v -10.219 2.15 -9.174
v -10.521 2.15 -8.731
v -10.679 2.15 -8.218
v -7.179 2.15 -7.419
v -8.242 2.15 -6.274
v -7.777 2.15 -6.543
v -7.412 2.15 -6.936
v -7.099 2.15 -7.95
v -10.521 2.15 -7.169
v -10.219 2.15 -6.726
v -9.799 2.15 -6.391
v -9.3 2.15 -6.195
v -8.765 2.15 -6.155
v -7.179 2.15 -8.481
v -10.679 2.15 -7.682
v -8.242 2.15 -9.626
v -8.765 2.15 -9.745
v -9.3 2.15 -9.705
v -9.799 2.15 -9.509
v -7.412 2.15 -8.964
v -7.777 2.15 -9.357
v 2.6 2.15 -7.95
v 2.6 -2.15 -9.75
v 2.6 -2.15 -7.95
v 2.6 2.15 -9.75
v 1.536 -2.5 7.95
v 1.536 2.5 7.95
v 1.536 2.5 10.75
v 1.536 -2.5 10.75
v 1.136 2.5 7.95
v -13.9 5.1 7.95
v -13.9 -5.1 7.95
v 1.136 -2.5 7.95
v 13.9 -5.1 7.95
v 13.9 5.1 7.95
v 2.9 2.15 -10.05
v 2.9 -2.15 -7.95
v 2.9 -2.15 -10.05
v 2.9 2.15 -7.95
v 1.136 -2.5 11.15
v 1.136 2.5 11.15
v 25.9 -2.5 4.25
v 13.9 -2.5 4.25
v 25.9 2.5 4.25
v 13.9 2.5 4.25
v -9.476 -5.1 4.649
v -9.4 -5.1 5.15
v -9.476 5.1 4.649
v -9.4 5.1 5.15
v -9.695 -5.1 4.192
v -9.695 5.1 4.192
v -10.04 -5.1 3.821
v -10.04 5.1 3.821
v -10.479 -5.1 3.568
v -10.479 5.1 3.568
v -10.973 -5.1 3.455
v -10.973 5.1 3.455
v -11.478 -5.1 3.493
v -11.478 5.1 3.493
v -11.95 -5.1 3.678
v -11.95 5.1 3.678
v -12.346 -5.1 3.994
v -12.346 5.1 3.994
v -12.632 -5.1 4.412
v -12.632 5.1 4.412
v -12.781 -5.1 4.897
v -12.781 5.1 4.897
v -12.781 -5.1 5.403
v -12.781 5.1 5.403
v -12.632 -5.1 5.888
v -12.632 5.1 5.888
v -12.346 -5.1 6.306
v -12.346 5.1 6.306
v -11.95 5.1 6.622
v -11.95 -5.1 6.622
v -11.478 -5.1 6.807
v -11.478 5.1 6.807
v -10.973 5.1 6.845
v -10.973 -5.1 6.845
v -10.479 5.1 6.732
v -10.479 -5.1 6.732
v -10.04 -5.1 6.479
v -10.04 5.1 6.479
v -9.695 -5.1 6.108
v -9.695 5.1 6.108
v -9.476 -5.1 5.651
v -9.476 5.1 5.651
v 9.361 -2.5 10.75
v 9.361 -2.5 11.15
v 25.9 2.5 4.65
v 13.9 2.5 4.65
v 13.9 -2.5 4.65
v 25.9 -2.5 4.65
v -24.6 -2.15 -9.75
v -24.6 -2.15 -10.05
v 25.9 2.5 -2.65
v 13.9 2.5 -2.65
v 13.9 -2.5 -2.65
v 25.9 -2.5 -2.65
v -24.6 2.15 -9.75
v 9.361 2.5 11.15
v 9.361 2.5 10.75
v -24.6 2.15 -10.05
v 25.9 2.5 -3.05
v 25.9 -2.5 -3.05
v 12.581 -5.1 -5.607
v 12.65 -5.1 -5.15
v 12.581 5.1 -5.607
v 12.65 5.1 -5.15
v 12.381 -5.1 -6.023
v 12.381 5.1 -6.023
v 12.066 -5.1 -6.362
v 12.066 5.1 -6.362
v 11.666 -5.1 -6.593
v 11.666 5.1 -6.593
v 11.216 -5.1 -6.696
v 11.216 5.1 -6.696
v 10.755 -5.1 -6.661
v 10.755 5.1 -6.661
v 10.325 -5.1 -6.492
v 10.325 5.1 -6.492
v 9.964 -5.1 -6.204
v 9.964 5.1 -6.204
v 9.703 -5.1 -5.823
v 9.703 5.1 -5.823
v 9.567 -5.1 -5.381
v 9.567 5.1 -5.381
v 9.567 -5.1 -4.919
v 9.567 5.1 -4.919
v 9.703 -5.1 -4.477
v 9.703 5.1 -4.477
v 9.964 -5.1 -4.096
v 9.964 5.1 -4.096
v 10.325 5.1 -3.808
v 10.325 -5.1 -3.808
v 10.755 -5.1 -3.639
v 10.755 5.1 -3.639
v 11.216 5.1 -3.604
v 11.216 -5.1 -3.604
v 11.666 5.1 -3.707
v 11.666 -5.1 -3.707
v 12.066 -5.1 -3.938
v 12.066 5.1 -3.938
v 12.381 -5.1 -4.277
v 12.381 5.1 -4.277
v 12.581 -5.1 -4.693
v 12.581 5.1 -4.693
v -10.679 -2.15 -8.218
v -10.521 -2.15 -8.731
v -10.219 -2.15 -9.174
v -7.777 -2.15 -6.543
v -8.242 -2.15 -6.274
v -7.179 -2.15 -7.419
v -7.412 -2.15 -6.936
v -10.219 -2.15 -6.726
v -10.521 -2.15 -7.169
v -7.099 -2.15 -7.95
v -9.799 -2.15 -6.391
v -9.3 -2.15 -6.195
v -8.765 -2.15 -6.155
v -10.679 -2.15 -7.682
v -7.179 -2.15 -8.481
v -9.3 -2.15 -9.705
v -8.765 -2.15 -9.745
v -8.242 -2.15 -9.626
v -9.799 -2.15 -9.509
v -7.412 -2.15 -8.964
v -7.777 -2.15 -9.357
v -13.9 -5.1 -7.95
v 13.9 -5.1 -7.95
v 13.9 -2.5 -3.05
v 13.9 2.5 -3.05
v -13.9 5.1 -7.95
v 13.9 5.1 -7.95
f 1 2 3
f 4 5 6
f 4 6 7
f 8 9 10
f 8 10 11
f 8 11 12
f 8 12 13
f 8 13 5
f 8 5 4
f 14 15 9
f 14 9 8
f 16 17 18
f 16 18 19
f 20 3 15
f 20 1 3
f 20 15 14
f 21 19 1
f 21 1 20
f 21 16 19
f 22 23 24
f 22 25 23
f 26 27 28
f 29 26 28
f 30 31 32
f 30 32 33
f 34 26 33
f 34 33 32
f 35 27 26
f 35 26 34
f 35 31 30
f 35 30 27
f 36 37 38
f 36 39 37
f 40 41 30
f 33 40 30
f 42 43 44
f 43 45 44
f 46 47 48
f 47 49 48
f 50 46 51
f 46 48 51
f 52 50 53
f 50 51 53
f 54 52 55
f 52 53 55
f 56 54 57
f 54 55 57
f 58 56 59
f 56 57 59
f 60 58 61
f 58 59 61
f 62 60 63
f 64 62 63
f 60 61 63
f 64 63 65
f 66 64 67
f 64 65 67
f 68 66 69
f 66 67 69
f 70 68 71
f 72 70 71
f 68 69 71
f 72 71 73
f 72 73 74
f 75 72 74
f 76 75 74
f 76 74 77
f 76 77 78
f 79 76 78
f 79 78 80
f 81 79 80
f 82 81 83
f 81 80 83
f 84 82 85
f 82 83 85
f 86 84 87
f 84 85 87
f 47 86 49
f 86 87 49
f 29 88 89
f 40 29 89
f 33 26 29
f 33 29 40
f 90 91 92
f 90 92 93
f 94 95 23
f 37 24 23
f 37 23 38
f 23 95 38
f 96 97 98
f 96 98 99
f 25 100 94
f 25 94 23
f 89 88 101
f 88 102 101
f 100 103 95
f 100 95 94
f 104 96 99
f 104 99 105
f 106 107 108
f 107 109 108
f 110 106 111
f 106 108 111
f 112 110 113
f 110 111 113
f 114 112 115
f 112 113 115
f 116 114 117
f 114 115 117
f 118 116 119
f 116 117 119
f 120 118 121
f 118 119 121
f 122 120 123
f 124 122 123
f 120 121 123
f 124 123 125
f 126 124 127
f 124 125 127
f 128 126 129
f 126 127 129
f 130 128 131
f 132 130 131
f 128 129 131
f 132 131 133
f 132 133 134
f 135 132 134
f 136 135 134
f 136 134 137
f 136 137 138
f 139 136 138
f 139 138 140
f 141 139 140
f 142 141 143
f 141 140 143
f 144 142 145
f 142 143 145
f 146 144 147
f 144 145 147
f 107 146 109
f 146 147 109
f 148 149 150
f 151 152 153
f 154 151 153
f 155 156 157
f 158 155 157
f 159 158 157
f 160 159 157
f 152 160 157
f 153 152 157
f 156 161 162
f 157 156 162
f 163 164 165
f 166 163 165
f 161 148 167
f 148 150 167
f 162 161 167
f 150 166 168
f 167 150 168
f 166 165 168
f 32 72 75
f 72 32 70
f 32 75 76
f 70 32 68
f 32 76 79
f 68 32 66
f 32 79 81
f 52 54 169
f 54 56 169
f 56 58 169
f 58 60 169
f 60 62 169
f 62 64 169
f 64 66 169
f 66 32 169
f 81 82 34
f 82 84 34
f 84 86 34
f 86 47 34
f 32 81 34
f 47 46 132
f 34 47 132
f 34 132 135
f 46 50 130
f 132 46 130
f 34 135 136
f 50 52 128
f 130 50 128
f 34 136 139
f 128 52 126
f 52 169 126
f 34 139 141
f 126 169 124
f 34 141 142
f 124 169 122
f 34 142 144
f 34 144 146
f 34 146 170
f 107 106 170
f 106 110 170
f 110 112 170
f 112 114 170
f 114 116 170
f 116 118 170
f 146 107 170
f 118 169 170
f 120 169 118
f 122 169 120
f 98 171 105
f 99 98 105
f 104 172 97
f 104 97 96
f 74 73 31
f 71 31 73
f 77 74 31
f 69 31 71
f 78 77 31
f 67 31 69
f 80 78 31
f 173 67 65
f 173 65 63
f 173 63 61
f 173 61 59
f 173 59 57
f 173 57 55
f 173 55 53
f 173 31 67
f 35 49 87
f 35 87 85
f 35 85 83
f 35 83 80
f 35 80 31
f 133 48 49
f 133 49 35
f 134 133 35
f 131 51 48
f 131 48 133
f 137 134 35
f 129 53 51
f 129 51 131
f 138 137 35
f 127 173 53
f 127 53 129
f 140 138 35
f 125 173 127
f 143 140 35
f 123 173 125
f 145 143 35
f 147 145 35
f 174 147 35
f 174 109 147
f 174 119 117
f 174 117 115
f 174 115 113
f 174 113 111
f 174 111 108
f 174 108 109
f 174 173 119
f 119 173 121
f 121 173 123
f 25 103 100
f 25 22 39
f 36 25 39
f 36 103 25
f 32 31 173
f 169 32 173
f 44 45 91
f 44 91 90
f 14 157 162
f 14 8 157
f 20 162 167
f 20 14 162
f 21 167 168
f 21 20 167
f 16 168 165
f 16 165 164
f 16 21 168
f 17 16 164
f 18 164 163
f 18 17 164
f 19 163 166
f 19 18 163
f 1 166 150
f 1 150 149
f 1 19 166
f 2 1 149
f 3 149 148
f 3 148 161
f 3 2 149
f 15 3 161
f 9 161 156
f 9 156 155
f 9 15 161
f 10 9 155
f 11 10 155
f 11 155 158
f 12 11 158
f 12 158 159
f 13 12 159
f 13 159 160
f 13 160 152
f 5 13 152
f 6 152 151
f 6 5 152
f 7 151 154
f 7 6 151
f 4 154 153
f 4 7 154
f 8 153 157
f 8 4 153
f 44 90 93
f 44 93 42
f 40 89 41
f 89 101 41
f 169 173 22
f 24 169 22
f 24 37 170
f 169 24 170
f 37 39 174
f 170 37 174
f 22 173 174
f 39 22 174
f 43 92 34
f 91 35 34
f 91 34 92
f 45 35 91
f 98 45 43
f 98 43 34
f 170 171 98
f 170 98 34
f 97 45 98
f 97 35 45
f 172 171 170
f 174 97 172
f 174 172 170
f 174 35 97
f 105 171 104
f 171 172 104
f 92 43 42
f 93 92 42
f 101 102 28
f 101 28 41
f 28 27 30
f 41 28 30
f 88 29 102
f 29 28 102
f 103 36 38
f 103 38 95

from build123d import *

# Parameters (mm, degrees)
SKETCH1_W               = 27.8
SKETCH1_H               = 15.9
BOSS_EXTRUDE1_DEPTH     = 5.1
SKETCH2_R               = 1.55
SKETCH2_R_2             = 1.7
CUT_EXTRUDE1_DEPTH      = 6.1
CUT_EXTRUDE1_DEPTH_BACK = 6.1
BOSS_EXTRUDE2_DEPTH     = 2.15
SKETCH4_R               = 1.8
BOSS_EXTRUDE6_DEPTH     = 2.15
SKETCH5_W               = 12
SKETCH5_H               = 0.4
BOSS_EXTRUDE7_DEPTH     = 2.5
LPATTERN1_COUNT         = 2
LPATTERN1_PITCH         = 7.3
BOSS_EXTRUDE8_DEPTH     = 2.5


with BuildPart() as part:
    # Sketch1 → Boss-Extrude1 (new body, symmetric)
    with BuildSketch(Plane(origin=(0, 0, 0), x_dir=(1, 0, 0), z_dir=(0, 1, 0))):
        Rectangle(SKETCH1_W, SKETCH1_H)
    extrude(amount=BOSS_EXTRUDE1_DEPTH, both=True)

    # Sketch2 → Cut-Extrude1 (cut, two sides)
    with BuildSketch(Plane(origin=(0, 0, 0), x_dir=(1, 0, 0), z_dir=(0, 1, 0))) as cut_extrude1_sk:
        with Locations((11.1, 5.15)):
            Circle(SKETCH2_R)
        with Locations((-11.1, -5.15)):
            Circle(SKETCH2_R_2)
    extrude(amount=CUT_EXTRUDE1_DEPTH, mode=Mode.SUBTRACT)
    extrude(cut_extrude1_sk.sketch, amount=-CUT_EXTRUDE1_DEPTH_BACK, mode=Mode.SUBTRACT)

    # Sketch3 → Boss-Extrude2 (add, symmetric)
    with BuildSketch(Plane(origin=(0, 0, 0), x_dir=(1, 0, 0), z_dir=(0, 1, 0))):
        Polygon((2.9, 7.95), (2.9, 10.05), (-24.6, 10.05), (-24.6, 9.75), (2.6, 9.75), (2.6, 7.95), align=None)
    extrude(amount=BOSS_EXTRUDE2_DEPTH, both=True)

    # Sketch5 → Boss-Extrude7 (add, symmetric)
    with BuildSketch(Plane(origin=(0, 0, 0), x_dir=(1, 0, 0), z_dir=(0, 1, 0))):
        with Locations((19.9, 2.85)):
            Rectangle(SKETCH5_W, SKETCH5_H)
    boss_extrude7 = extrude(amount=BOSS_EXTRUDE7_DEPTH, both=True)

    # LPattern1: Boss-Extrude7 ×2
    with Locations(*[(0, 0, i * LPATTERN1_PITCH) for i in range(1, LPATTERN1_COUNT)]):
        add(boss_extrude7)

    # Sketch6 → Boss-Extrude8 (add, symmetric)
    with BuildSketch(Plane(origin=(0, 0, 0), x_dir=(1, 0, 0), z_dir=(0, 1, 0))):
        Polygon((1.535522272, -7.95), (1.535522272, -10.75), (9.361043521, -10.75), (9.361043521, -11.15), (1.135522272, -11.15), (1.135522272, -7.95), align=None)
    extrude(amount=BOSS_EXTRUDE8_DEPTH, both=True)


with BuildPart() as body_2:
    # Sketch4 → Boss-Extrude6 (new body, symmetric)
    with BuildSketch(Plane(origin=(0, 0, 0), x_dir=(1, 0, 0), z_dir=(0, 1, 0))):
        with Locations((-8.899200678, 7.95)):
            Circle(SKETCH4_R)
    extrude(amount=BOSS_EXTRUDE6_DEPTH, both=True)


solid = Compound([part.part, body_2.part])
